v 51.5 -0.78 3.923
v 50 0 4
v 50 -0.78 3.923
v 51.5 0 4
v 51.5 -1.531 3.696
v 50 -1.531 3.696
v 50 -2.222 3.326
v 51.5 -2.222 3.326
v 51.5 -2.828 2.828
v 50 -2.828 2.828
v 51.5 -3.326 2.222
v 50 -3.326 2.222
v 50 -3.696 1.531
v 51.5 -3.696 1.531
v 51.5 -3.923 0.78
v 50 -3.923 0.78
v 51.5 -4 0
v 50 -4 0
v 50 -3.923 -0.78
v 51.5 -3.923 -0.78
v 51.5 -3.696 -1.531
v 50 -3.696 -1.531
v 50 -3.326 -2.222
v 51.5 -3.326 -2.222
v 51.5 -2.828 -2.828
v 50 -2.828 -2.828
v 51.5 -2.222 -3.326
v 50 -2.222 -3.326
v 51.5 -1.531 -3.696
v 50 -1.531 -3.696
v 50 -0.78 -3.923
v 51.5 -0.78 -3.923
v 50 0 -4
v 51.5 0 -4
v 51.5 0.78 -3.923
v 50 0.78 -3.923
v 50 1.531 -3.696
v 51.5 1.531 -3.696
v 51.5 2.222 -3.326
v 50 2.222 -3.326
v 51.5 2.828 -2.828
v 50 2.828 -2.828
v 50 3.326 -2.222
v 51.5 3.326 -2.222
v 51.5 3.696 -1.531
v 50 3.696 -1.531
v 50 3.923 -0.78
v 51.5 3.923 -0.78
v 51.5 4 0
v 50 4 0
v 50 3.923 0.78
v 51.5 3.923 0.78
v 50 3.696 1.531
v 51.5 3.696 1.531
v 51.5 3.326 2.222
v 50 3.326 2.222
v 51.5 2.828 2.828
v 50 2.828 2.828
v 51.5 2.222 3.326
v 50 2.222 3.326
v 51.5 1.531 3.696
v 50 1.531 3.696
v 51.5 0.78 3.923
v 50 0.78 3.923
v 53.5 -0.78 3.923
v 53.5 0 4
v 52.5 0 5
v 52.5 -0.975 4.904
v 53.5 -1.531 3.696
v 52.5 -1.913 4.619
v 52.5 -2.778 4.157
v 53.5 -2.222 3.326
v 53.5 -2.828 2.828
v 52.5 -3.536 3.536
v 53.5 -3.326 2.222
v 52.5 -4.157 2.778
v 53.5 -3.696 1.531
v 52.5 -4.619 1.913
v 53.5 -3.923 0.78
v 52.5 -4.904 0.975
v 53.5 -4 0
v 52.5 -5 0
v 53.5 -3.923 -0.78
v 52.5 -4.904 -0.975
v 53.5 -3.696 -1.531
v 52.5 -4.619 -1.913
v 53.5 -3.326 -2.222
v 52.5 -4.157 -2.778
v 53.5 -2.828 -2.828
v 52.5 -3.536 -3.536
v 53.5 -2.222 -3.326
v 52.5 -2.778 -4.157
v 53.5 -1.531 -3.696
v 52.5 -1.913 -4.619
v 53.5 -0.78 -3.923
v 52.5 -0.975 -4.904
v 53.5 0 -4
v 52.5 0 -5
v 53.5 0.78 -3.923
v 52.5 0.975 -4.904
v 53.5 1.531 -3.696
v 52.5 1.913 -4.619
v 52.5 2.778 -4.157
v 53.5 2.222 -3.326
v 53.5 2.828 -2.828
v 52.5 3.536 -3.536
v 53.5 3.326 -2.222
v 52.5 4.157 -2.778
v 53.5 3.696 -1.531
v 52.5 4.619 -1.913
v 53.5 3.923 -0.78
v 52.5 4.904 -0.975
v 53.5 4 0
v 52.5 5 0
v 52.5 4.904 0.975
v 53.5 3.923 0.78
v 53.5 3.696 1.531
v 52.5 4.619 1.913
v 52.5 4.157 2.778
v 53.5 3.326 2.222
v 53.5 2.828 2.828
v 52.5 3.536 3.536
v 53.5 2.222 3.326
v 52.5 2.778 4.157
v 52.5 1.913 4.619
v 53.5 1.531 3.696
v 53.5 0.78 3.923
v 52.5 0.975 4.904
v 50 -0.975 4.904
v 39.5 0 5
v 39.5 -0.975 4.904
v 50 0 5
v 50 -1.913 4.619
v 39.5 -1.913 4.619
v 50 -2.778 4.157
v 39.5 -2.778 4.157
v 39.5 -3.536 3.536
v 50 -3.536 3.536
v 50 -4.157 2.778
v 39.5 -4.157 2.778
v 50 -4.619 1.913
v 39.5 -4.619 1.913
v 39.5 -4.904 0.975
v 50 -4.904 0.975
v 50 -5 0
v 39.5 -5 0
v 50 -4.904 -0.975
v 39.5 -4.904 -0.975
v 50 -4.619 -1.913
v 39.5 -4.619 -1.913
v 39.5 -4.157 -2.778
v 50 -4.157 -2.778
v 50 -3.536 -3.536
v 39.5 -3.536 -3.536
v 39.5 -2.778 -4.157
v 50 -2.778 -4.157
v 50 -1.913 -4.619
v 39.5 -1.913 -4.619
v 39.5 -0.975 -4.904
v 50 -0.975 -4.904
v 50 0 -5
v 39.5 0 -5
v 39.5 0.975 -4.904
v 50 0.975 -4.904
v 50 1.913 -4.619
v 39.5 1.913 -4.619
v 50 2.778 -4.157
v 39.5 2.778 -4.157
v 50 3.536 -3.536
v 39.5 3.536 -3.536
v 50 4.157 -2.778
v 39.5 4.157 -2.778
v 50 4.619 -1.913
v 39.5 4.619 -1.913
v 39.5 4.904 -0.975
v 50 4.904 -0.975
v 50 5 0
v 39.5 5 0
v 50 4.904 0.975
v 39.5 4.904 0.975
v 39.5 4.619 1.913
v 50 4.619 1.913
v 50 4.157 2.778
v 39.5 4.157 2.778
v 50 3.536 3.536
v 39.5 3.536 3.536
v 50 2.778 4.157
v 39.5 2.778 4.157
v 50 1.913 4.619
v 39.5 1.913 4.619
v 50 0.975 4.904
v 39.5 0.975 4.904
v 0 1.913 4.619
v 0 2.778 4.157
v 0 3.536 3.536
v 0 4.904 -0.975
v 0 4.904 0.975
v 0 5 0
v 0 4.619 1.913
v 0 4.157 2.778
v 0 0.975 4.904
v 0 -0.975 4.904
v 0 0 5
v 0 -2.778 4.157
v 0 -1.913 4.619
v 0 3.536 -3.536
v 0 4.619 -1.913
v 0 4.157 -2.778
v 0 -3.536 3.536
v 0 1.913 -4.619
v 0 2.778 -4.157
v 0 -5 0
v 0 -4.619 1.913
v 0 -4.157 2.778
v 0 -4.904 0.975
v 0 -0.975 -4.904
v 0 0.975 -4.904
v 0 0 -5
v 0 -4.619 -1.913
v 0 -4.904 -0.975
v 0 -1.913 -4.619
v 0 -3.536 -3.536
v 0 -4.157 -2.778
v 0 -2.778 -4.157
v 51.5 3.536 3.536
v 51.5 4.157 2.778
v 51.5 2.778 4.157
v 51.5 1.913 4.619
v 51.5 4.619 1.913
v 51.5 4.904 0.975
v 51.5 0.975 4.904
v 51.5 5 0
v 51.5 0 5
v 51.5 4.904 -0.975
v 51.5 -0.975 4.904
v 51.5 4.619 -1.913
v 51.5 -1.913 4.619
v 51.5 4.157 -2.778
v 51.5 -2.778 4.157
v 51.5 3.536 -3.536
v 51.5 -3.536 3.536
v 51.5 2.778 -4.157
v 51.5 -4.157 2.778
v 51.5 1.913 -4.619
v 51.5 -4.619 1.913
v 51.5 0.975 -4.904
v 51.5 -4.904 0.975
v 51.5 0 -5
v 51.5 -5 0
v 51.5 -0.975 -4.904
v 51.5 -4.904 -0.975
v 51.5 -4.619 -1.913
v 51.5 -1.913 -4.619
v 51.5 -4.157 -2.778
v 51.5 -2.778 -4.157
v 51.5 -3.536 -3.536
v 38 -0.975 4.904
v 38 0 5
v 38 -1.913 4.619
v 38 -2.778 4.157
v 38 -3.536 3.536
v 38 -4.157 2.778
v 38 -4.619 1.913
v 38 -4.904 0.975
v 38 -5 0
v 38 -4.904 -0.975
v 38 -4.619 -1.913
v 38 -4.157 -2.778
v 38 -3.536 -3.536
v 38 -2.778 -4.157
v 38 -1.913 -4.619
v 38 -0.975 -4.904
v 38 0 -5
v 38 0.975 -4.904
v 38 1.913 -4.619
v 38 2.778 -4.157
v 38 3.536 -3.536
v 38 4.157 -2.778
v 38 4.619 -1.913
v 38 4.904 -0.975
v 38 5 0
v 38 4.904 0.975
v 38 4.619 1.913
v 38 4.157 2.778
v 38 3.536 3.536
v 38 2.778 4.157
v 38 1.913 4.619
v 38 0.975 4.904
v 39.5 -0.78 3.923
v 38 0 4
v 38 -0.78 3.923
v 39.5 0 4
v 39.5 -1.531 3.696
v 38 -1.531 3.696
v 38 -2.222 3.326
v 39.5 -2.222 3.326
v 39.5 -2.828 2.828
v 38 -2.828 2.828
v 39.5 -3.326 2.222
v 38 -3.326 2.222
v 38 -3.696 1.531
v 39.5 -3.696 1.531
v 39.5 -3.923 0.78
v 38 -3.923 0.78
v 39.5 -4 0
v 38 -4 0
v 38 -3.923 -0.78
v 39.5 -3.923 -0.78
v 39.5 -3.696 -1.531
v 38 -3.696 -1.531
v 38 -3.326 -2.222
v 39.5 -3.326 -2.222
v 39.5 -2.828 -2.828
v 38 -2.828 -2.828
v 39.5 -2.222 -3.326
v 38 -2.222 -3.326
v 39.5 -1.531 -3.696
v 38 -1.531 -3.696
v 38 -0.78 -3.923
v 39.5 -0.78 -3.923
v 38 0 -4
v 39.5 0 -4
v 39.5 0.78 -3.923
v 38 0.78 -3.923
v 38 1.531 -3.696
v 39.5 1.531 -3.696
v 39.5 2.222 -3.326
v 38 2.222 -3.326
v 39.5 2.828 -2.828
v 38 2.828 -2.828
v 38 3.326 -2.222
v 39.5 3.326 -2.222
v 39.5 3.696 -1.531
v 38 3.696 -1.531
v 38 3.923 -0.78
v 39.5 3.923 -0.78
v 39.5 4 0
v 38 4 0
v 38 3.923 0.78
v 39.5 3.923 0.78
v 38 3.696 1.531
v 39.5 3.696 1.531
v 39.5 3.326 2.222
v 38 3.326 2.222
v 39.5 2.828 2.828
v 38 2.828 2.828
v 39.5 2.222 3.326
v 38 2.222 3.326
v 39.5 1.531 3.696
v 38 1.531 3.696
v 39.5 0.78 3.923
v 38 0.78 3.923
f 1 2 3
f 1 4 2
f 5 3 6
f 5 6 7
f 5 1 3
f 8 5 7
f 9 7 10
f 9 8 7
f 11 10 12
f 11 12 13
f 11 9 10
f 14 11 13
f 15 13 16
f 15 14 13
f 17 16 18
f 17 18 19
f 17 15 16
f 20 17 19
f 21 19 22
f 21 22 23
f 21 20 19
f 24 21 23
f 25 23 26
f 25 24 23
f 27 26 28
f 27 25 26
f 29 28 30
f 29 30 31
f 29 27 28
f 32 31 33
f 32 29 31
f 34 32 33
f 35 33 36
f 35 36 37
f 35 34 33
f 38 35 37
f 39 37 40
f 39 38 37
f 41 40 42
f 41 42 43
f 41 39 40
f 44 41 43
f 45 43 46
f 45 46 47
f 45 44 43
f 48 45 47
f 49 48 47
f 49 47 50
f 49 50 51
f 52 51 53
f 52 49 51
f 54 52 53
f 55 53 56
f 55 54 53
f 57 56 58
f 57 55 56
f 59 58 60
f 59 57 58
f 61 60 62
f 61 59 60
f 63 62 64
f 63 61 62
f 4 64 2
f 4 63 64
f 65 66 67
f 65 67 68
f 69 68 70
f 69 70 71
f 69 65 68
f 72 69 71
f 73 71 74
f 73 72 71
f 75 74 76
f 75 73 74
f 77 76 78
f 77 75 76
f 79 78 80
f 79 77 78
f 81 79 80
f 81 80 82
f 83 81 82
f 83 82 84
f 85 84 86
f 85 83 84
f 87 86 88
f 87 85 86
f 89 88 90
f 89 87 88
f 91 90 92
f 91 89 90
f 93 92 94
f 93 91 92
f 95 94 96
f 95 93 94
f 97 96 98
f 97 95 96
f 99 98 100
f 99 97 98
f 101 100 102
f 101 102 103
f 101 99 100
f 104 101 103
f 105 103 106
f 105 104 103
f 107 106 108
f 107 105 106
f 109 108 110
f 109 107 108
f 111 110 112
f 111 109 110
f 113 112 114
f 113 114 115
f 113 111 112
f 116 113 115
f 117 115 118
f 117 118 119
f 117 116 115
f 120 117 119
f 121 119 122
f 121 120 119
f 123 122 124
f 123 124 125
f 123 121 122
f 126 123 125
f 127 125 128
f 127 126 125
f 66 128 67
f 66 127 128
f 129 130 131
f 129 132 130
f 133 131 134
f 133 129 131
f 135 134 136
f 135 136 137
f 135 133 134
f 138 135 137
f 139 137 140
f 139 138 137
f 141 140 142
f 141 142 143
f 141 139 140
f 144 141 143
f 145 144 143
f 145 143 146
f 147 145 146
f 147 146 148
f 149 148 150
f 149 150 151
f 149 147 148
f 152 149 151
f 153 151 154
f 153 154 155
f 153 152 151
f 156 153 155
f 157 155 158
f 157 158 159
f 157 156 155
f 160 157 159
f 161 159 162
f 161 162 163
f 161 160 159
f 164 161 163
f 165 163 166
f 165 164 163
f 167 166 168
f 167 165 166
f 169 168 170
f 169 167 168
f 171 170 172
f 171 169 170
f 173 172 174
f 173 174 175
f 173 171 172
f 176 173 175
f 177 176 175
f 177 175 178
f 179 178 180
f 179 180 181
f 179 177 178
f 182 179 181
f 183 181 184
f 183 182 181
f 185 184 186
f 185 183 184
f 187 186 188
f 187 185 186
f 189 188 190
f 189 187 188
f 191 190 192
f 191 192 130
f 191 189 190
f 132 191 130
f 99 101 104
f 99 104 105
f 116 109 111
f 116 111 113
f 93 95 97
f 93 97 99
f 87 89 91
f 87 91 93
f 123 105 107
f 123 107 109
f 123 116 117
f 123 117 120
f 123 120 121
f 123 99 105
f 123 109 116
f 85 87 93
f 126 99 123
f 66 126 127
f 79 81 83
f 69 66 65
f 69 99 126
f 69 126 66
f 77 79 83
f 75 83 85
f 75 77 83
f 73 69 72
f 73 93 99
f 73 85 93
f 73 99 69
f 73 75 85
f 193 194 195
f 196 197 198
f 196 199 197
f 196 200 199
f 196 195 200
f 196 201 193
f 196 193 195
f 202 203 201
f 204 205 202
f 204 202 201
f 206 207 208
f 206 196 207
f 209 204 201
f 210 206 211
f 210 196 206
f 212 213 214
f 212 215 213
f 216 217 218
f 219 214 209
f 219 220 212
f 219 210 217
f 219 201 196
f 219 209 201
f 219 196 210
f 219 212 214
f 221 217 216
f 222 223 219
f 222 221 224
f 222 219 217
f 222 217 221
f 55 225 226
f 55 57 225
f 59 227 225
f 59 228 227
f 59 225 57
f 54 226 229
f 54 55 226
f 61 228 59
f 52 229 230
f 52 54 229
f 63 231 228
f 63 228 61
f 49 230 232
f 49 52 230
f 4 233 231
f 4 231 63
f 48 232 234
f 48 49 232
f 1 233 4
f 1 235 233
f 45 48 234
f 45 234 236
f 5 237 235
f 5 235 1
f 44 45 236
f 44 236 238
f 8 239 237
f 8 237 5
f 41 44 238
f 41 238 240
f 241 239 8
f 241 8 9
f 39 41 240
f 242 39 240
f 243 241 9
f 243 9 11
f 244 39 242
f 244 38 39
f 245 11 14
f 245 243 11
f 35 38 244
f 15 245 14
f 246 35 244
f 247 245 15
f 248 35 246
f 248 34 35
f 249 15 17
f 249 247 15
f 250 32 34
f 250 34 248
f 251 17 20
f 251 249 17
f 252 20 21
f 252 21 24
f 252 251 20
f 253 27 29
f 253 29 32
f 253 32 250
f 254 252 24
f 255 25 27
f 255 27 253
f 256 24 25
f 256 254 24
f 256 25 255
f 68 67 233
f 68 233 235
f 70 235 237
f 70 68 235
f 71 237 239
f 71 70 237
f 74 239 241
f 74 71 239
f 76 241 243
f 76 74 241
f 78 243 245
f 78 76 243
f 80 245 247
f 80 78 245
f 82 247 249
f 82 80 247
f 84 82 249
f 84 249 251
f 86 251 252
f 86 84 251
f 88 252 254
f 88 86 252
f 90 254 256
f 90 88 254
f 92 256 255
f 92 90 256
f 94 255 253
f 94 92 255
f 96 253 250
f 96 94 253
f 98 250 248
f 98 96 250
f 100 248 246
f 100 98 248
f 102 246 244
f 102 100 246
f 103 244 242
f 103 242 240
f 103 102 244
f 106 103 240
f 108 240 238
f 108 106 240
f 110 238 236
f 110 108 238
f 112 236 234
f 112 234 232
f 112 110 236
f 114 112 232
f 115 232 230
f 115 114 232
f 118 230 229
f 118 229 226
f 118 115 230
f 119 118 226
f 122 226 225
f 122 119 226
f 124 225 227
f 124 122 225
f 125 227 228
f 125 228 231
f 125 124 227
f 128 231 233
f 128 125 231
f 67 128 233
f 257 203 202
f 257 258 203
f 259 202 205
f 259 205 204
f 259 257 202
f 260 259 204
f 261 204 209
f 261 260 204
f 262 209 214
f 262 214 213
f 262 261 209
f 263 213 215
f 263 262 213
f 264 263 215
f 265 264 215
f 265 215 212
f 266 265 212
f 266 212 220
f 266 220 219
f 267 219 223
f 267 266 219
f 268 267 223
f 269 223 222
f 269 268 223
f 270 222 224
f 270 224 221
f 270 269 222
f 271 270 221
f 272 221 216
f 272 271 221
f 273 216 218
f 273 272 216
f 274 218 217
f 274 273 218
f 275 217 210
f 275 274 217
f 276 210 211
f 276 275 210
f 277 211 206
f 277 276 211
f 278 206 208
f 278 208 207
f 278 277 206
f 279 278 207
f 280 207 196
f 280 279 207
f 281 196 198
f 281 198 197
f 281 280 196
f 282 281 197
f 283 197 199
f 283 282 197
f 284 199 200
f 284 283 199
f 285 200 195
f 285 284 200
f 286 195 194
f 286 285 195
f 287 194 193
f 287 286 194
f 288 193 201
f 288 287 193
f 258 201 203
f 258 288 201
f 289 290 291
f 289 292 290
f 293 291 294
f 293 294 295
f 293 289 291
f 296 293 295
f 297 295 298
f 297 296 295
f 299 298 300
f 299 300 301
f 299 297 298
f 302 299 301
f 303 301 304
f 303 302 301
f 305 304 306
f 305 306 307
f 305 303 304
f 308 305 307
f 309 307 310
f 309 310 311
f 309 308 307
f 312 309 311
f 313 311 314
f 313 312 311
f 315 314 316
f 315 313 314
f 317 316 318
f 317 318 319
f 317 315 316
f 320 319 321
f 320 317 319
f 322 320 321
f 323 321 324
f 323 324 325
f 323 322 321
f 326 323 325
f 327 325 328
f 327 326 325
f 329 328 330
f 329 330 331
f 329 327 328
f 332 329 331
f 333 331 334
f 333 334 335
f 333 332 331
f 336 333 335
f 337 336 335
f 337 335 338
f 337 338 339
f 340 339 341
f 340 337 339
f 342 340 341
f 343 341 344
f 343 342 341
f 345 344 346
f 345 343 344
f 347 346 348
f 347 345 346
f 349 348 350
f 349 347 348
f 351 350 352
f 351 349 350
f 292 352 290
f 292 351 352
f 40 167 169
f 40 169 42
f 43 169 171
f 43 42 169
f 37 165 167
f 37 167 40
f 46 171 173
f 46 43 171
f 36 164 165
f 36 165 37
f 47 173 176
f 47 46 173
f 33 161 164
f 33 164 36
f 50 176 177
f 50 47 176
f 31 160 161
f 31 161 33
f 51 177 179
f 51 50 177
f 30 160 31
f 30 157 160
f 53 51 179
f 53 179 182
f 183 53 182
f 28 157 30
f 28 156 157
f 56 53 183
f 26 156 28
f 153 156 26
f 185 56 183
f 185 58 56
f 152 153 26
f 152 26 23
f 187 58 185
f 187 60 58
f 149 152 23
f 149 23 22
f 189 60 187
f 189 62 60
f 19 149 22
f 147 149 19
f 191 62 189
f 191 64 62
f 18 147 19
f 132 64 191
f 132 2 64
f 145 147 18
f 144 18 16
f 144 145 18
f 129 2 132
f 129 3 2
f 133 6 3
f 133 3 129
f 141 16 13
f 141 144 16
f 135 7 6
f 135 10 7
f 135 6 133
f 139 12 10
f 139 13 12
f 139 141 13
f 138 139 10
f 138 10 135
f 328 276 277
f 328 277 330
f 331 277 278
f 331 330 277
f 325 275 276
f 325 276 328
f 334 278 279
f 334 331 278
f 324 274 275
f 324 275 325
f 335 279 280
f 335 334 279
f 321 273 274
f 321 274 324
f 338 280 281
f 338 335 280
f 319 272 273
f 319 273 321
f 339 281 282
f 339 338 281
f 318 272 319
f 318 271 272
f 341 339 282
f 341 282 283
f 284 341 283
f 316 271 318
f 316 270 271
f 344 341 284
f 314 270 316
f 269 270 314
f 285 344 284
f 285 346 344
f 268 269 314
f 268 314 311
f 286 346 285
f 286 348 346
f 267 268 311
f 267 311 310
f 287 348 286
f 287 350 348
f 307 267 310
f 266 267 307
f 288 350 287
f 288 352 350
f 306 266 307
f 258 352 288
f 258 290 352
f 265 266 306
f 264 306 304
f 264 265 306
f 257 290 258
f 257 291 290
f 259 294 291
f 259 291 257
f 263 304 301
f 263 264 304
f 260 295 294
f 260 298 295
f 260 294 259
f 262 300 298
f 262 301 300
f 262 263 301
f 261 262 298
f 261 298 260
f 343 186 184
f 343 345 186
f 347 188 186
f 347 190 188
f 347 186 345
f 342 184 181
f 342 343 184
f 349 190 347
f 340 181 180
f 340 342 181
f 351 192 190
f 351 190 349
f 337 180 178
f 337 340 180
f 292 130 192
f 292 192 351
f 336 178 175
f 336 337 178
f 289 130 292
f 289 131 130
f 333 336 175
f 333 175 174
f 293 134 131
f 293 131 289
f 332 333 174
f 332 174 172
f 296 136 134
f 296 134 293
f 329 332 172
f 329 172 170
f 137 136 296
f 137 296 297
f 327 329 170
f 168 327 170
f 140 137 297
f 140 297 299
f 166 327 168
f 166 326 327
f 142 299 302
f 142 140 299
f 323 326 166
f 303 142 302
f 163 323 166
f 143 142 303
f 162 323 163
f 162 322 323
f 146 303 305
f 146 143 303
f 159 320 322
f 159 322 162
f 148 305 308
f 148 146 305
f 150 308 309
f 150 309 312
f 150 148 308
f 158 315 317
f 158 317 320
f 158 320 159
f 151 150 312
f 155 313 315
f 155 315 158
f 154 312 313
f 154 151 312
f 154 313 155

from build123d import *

# Parameters (mm, degrees)
CHAMFER1_SIZE = 1


with BuildPart() as part:
    # Sketch1 → Revolve1 (revolve)
    with BuildSketch(Plane.XY, mode=Mode.PRIVATE) as revolve1_sk:
        Polygon((0, 0), (0, 5), (38, 5), (38, 4), (39.5, 4), (39.5, 5), (50, 5), (50, 4), (51.5, 4), (51.5, 5), (53.5, 5), (53.5, 0), align=None)
    revolve(revolve1_sk.sketch.rotate(Axis((-16.67807852, 0, 0), (1, 0, 0)), 90), axis=Axis((-16.67807852, 0, 0), (1, 0, 0)))

    # Chamfer1
    chamfer1_edges = [part.edges().sort_by_distance(p)[0] for p in [
        (53.5, 0, -5),
    ]]
    chamfer(chamfer1_edges, length=CHAMFER1_SIZE)


solid = part.part
